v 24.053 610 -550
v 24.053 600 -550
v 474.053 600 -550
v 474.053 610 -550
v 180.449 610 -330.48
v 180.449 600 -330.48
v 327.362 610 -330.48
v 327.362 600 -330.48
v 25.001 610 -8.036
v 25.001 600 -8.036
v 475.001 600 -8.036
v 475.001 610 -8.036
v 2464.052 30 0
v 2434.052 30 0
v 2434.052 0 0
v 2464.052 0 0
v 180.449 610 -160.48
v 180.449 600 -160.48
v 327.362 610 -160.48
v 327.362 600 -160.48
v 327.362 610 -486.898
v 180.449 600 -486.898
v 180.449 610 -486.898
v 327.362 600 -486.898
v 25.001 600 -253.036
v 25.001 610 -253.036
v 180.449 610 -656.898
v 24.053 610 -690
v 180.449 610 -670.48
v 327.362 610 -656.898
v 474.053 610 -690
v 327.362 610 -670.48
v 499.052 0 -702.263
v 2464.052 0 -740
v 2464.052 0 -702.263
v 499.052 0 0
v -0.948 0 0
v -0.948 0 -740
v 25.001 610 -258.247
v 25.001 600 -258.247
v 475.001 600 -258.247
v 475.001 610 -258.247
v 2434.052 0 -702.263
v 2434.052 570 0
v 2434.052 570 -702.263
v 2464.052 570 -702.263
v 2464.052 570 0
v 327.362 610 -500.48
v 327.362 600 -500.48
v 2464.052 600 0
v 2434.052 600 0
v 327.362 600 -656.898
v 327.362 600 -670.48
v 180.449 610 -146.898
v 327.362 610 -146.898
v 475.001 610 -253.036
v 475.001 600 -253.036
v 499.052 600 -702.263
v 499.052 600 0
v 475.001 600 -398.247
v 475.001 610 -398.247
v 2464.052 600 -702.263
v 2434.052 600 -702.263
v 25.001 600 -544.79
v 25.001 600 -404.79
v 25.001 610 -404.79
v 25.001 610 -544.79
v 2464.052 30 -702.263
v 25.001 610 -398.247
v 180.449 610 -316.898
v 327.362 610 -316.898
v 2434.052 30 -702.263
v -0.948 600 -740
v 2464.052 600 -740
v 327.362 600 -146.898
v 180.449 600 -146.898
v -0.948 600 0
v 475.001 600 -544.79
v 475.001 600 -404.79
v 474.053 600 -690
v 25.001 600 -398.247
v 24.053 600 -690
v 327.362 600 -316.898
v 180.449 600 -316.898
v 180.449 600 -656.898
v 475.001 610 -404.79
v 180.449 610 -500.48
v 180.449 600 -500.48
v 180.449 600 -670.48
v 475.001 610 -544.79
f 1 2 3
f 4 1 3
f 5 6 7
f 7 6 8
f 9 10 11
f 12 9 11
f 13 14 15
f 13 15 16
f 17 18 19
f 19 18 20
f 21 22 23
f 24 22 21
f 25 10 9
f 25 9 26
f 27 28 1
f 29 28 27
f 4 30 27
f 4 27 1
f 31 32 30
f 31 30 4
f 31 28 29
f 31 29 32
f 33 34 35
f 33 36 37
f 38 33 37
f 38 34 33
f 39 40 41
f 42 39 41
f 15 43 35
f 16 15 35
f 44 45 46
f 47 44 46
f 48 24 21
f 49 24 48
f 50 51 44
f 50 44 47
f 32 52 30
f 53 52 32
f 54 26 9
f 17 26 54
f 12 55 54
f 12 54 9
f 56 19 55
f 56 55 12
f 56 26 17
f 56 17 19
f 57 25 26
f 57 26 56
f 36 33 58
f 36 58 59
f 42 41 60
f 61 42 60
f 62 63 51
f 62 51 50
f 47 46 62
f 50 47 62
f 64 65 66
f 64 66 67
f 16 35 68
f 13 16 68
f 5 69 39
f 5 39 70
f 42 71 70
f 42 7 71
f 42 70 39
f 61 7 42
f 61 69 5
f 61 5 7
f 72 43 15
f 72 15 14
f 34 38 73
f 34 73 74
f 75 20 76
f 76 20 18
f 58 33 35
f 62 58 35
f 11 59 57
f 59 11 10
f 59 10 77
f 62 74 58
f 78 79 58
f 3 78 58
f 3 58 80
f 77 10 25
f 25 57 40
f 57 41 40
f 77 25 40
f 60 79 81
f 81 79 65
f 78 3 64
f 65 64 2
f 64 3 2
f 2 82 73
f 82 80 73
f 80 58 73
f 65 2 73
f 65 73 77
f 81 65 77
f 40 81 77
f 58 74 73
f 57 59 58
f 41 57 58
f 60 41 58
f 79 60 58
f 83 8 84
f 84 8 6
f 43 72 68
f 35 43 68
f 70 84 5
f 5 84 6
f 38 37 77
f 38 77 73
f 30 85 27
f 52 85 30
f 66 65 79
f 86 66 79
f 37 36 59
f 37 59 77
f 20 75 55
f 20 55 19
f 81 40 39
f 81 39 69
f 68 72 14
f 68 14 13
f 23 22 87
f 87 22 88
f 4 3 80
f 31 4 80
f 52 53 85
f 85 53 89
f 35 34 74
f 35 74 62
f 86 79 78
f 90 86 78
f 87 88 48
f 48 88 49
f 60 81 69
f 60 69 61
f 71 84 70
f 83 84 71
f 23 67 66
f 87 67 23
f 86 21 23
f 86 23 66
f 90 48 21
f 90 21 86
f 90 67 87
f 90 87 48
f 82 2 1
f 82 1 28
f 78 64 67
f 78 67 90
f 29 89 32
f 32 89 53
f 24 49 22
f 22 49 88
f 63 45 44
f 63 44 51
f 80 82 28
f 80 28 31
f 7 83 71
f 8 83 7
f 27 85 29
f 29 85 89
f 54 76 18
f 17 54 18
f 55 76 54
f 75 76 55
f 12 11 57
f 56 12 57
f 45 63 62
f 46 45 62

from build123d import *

# Parameters (mm, degrees)
BOSS_EXTRUDE1_DEPTH   = 600
SKETCH2_W             = 450
SKETCH2_H             = 140
SKETCH2_W_2           = 146.91343935
SKETCH2_H_2           = 13.581682478
SKETCH2_H_3           = 245
BOSS_EXTRUDE2_DEPTH   = 10
SKETCH3_W             = 30
SKETCH3_H             = 30
BOSS_EXTRUDE3_DEPTH   = 702.263166
BOSS_EXTRUDE3_2_DEPTH = 702.263166


with BuildPart() as part:
    # Sketch1 → Boss-Extrude1 (new body)
    with BuildSketch(Plane(origin=(0, 0, 0), x_dir=(1, 0, 0), z_dir=(0, 1, 0))):
        Polygon((-0.948488695, 0), (-0.948488695, 740), (2464.051511305, 740), (2464.051511305, 702.263165655), (1965, 702.263165655), (499.051511305, 702.263165655), (499.051511305, 0), align=None)
    extrude(amount=BOSS_EXTRUDE1_DEPTH)

    # Sketch2 → Boss-Extrude2 (add)
    with BuildSketch(Plane(origin=(0, 600, 0), x_dir=(1, 0, 0), z_dir=(0, 1, 0))):
        with Locations((249.05278621, 620)):
            Rectangle(SKETCH2_W, SKETCH2_H)
        with Locations((253.905576666, 663.689083521)):
            Rectangle(SKETCH2_W_2, SKETCH2_H_2, mode=Mode.SUBTRACT)
        with Locations((250.001274905, 474.789512045)):
            Rectangle(SKETCH2_W, SKETCH2_H)
        with Locations((253.905576666, 493.689083521)):
            Rectangle(SKETCH2_W_2, SKETCH2_H_2, mode=Mode.SUBTRACT)
        with Locations((250.001274905, 328.246947066)):
            Rectangle(SKETCH2_W, SKETCH2_H)
        with Locations((253.905576666, 323.689083521)):
            Rectangle(SKETCH2_W_2, SKETCH2_H_2, mode=Mode.SUBTRACT)
        with Locations((250.001274905, 130.536459111)):
            Rectangle(SKETCH2_W, SKETCH2_H_3)
        with Locations((253.905576666, 153.689083521)):
            Rectangle(SKETCH2_W_2, SKETCH2_H_2, mode=Mode.SUBTRACT)
    extrude(amount=BOSS_EXTRUDE2_DEPTH)


with BuildPart() as body_2:
    # Sketch3 → Boss-Extrude3 (new body)
    with BuildSketch(Plane.XY.offset(-702.263165655)):
        with Locations((2449.051511305, 15)):
            Rectangle(SKETCH3_W, SKETCH3_H)
    extrude(amount=BOSS_EXTRUDE3_DEPTH)


with BuildPart() as body_3:
    # Sketch3 → Boss-Extrude3 2 (new body)
    with BuildSketch(Plane.XY.offset(-702.263165655)):
        with Locations((2449.051511305, 585)):
            Rectangle(SKETCH3_W, SKETCH3_H)
    extrude(amount=BOSS_EXTRUDE3_2_DEPTH)


solid = Compound([part.part, body_2.part, body_3.part])
